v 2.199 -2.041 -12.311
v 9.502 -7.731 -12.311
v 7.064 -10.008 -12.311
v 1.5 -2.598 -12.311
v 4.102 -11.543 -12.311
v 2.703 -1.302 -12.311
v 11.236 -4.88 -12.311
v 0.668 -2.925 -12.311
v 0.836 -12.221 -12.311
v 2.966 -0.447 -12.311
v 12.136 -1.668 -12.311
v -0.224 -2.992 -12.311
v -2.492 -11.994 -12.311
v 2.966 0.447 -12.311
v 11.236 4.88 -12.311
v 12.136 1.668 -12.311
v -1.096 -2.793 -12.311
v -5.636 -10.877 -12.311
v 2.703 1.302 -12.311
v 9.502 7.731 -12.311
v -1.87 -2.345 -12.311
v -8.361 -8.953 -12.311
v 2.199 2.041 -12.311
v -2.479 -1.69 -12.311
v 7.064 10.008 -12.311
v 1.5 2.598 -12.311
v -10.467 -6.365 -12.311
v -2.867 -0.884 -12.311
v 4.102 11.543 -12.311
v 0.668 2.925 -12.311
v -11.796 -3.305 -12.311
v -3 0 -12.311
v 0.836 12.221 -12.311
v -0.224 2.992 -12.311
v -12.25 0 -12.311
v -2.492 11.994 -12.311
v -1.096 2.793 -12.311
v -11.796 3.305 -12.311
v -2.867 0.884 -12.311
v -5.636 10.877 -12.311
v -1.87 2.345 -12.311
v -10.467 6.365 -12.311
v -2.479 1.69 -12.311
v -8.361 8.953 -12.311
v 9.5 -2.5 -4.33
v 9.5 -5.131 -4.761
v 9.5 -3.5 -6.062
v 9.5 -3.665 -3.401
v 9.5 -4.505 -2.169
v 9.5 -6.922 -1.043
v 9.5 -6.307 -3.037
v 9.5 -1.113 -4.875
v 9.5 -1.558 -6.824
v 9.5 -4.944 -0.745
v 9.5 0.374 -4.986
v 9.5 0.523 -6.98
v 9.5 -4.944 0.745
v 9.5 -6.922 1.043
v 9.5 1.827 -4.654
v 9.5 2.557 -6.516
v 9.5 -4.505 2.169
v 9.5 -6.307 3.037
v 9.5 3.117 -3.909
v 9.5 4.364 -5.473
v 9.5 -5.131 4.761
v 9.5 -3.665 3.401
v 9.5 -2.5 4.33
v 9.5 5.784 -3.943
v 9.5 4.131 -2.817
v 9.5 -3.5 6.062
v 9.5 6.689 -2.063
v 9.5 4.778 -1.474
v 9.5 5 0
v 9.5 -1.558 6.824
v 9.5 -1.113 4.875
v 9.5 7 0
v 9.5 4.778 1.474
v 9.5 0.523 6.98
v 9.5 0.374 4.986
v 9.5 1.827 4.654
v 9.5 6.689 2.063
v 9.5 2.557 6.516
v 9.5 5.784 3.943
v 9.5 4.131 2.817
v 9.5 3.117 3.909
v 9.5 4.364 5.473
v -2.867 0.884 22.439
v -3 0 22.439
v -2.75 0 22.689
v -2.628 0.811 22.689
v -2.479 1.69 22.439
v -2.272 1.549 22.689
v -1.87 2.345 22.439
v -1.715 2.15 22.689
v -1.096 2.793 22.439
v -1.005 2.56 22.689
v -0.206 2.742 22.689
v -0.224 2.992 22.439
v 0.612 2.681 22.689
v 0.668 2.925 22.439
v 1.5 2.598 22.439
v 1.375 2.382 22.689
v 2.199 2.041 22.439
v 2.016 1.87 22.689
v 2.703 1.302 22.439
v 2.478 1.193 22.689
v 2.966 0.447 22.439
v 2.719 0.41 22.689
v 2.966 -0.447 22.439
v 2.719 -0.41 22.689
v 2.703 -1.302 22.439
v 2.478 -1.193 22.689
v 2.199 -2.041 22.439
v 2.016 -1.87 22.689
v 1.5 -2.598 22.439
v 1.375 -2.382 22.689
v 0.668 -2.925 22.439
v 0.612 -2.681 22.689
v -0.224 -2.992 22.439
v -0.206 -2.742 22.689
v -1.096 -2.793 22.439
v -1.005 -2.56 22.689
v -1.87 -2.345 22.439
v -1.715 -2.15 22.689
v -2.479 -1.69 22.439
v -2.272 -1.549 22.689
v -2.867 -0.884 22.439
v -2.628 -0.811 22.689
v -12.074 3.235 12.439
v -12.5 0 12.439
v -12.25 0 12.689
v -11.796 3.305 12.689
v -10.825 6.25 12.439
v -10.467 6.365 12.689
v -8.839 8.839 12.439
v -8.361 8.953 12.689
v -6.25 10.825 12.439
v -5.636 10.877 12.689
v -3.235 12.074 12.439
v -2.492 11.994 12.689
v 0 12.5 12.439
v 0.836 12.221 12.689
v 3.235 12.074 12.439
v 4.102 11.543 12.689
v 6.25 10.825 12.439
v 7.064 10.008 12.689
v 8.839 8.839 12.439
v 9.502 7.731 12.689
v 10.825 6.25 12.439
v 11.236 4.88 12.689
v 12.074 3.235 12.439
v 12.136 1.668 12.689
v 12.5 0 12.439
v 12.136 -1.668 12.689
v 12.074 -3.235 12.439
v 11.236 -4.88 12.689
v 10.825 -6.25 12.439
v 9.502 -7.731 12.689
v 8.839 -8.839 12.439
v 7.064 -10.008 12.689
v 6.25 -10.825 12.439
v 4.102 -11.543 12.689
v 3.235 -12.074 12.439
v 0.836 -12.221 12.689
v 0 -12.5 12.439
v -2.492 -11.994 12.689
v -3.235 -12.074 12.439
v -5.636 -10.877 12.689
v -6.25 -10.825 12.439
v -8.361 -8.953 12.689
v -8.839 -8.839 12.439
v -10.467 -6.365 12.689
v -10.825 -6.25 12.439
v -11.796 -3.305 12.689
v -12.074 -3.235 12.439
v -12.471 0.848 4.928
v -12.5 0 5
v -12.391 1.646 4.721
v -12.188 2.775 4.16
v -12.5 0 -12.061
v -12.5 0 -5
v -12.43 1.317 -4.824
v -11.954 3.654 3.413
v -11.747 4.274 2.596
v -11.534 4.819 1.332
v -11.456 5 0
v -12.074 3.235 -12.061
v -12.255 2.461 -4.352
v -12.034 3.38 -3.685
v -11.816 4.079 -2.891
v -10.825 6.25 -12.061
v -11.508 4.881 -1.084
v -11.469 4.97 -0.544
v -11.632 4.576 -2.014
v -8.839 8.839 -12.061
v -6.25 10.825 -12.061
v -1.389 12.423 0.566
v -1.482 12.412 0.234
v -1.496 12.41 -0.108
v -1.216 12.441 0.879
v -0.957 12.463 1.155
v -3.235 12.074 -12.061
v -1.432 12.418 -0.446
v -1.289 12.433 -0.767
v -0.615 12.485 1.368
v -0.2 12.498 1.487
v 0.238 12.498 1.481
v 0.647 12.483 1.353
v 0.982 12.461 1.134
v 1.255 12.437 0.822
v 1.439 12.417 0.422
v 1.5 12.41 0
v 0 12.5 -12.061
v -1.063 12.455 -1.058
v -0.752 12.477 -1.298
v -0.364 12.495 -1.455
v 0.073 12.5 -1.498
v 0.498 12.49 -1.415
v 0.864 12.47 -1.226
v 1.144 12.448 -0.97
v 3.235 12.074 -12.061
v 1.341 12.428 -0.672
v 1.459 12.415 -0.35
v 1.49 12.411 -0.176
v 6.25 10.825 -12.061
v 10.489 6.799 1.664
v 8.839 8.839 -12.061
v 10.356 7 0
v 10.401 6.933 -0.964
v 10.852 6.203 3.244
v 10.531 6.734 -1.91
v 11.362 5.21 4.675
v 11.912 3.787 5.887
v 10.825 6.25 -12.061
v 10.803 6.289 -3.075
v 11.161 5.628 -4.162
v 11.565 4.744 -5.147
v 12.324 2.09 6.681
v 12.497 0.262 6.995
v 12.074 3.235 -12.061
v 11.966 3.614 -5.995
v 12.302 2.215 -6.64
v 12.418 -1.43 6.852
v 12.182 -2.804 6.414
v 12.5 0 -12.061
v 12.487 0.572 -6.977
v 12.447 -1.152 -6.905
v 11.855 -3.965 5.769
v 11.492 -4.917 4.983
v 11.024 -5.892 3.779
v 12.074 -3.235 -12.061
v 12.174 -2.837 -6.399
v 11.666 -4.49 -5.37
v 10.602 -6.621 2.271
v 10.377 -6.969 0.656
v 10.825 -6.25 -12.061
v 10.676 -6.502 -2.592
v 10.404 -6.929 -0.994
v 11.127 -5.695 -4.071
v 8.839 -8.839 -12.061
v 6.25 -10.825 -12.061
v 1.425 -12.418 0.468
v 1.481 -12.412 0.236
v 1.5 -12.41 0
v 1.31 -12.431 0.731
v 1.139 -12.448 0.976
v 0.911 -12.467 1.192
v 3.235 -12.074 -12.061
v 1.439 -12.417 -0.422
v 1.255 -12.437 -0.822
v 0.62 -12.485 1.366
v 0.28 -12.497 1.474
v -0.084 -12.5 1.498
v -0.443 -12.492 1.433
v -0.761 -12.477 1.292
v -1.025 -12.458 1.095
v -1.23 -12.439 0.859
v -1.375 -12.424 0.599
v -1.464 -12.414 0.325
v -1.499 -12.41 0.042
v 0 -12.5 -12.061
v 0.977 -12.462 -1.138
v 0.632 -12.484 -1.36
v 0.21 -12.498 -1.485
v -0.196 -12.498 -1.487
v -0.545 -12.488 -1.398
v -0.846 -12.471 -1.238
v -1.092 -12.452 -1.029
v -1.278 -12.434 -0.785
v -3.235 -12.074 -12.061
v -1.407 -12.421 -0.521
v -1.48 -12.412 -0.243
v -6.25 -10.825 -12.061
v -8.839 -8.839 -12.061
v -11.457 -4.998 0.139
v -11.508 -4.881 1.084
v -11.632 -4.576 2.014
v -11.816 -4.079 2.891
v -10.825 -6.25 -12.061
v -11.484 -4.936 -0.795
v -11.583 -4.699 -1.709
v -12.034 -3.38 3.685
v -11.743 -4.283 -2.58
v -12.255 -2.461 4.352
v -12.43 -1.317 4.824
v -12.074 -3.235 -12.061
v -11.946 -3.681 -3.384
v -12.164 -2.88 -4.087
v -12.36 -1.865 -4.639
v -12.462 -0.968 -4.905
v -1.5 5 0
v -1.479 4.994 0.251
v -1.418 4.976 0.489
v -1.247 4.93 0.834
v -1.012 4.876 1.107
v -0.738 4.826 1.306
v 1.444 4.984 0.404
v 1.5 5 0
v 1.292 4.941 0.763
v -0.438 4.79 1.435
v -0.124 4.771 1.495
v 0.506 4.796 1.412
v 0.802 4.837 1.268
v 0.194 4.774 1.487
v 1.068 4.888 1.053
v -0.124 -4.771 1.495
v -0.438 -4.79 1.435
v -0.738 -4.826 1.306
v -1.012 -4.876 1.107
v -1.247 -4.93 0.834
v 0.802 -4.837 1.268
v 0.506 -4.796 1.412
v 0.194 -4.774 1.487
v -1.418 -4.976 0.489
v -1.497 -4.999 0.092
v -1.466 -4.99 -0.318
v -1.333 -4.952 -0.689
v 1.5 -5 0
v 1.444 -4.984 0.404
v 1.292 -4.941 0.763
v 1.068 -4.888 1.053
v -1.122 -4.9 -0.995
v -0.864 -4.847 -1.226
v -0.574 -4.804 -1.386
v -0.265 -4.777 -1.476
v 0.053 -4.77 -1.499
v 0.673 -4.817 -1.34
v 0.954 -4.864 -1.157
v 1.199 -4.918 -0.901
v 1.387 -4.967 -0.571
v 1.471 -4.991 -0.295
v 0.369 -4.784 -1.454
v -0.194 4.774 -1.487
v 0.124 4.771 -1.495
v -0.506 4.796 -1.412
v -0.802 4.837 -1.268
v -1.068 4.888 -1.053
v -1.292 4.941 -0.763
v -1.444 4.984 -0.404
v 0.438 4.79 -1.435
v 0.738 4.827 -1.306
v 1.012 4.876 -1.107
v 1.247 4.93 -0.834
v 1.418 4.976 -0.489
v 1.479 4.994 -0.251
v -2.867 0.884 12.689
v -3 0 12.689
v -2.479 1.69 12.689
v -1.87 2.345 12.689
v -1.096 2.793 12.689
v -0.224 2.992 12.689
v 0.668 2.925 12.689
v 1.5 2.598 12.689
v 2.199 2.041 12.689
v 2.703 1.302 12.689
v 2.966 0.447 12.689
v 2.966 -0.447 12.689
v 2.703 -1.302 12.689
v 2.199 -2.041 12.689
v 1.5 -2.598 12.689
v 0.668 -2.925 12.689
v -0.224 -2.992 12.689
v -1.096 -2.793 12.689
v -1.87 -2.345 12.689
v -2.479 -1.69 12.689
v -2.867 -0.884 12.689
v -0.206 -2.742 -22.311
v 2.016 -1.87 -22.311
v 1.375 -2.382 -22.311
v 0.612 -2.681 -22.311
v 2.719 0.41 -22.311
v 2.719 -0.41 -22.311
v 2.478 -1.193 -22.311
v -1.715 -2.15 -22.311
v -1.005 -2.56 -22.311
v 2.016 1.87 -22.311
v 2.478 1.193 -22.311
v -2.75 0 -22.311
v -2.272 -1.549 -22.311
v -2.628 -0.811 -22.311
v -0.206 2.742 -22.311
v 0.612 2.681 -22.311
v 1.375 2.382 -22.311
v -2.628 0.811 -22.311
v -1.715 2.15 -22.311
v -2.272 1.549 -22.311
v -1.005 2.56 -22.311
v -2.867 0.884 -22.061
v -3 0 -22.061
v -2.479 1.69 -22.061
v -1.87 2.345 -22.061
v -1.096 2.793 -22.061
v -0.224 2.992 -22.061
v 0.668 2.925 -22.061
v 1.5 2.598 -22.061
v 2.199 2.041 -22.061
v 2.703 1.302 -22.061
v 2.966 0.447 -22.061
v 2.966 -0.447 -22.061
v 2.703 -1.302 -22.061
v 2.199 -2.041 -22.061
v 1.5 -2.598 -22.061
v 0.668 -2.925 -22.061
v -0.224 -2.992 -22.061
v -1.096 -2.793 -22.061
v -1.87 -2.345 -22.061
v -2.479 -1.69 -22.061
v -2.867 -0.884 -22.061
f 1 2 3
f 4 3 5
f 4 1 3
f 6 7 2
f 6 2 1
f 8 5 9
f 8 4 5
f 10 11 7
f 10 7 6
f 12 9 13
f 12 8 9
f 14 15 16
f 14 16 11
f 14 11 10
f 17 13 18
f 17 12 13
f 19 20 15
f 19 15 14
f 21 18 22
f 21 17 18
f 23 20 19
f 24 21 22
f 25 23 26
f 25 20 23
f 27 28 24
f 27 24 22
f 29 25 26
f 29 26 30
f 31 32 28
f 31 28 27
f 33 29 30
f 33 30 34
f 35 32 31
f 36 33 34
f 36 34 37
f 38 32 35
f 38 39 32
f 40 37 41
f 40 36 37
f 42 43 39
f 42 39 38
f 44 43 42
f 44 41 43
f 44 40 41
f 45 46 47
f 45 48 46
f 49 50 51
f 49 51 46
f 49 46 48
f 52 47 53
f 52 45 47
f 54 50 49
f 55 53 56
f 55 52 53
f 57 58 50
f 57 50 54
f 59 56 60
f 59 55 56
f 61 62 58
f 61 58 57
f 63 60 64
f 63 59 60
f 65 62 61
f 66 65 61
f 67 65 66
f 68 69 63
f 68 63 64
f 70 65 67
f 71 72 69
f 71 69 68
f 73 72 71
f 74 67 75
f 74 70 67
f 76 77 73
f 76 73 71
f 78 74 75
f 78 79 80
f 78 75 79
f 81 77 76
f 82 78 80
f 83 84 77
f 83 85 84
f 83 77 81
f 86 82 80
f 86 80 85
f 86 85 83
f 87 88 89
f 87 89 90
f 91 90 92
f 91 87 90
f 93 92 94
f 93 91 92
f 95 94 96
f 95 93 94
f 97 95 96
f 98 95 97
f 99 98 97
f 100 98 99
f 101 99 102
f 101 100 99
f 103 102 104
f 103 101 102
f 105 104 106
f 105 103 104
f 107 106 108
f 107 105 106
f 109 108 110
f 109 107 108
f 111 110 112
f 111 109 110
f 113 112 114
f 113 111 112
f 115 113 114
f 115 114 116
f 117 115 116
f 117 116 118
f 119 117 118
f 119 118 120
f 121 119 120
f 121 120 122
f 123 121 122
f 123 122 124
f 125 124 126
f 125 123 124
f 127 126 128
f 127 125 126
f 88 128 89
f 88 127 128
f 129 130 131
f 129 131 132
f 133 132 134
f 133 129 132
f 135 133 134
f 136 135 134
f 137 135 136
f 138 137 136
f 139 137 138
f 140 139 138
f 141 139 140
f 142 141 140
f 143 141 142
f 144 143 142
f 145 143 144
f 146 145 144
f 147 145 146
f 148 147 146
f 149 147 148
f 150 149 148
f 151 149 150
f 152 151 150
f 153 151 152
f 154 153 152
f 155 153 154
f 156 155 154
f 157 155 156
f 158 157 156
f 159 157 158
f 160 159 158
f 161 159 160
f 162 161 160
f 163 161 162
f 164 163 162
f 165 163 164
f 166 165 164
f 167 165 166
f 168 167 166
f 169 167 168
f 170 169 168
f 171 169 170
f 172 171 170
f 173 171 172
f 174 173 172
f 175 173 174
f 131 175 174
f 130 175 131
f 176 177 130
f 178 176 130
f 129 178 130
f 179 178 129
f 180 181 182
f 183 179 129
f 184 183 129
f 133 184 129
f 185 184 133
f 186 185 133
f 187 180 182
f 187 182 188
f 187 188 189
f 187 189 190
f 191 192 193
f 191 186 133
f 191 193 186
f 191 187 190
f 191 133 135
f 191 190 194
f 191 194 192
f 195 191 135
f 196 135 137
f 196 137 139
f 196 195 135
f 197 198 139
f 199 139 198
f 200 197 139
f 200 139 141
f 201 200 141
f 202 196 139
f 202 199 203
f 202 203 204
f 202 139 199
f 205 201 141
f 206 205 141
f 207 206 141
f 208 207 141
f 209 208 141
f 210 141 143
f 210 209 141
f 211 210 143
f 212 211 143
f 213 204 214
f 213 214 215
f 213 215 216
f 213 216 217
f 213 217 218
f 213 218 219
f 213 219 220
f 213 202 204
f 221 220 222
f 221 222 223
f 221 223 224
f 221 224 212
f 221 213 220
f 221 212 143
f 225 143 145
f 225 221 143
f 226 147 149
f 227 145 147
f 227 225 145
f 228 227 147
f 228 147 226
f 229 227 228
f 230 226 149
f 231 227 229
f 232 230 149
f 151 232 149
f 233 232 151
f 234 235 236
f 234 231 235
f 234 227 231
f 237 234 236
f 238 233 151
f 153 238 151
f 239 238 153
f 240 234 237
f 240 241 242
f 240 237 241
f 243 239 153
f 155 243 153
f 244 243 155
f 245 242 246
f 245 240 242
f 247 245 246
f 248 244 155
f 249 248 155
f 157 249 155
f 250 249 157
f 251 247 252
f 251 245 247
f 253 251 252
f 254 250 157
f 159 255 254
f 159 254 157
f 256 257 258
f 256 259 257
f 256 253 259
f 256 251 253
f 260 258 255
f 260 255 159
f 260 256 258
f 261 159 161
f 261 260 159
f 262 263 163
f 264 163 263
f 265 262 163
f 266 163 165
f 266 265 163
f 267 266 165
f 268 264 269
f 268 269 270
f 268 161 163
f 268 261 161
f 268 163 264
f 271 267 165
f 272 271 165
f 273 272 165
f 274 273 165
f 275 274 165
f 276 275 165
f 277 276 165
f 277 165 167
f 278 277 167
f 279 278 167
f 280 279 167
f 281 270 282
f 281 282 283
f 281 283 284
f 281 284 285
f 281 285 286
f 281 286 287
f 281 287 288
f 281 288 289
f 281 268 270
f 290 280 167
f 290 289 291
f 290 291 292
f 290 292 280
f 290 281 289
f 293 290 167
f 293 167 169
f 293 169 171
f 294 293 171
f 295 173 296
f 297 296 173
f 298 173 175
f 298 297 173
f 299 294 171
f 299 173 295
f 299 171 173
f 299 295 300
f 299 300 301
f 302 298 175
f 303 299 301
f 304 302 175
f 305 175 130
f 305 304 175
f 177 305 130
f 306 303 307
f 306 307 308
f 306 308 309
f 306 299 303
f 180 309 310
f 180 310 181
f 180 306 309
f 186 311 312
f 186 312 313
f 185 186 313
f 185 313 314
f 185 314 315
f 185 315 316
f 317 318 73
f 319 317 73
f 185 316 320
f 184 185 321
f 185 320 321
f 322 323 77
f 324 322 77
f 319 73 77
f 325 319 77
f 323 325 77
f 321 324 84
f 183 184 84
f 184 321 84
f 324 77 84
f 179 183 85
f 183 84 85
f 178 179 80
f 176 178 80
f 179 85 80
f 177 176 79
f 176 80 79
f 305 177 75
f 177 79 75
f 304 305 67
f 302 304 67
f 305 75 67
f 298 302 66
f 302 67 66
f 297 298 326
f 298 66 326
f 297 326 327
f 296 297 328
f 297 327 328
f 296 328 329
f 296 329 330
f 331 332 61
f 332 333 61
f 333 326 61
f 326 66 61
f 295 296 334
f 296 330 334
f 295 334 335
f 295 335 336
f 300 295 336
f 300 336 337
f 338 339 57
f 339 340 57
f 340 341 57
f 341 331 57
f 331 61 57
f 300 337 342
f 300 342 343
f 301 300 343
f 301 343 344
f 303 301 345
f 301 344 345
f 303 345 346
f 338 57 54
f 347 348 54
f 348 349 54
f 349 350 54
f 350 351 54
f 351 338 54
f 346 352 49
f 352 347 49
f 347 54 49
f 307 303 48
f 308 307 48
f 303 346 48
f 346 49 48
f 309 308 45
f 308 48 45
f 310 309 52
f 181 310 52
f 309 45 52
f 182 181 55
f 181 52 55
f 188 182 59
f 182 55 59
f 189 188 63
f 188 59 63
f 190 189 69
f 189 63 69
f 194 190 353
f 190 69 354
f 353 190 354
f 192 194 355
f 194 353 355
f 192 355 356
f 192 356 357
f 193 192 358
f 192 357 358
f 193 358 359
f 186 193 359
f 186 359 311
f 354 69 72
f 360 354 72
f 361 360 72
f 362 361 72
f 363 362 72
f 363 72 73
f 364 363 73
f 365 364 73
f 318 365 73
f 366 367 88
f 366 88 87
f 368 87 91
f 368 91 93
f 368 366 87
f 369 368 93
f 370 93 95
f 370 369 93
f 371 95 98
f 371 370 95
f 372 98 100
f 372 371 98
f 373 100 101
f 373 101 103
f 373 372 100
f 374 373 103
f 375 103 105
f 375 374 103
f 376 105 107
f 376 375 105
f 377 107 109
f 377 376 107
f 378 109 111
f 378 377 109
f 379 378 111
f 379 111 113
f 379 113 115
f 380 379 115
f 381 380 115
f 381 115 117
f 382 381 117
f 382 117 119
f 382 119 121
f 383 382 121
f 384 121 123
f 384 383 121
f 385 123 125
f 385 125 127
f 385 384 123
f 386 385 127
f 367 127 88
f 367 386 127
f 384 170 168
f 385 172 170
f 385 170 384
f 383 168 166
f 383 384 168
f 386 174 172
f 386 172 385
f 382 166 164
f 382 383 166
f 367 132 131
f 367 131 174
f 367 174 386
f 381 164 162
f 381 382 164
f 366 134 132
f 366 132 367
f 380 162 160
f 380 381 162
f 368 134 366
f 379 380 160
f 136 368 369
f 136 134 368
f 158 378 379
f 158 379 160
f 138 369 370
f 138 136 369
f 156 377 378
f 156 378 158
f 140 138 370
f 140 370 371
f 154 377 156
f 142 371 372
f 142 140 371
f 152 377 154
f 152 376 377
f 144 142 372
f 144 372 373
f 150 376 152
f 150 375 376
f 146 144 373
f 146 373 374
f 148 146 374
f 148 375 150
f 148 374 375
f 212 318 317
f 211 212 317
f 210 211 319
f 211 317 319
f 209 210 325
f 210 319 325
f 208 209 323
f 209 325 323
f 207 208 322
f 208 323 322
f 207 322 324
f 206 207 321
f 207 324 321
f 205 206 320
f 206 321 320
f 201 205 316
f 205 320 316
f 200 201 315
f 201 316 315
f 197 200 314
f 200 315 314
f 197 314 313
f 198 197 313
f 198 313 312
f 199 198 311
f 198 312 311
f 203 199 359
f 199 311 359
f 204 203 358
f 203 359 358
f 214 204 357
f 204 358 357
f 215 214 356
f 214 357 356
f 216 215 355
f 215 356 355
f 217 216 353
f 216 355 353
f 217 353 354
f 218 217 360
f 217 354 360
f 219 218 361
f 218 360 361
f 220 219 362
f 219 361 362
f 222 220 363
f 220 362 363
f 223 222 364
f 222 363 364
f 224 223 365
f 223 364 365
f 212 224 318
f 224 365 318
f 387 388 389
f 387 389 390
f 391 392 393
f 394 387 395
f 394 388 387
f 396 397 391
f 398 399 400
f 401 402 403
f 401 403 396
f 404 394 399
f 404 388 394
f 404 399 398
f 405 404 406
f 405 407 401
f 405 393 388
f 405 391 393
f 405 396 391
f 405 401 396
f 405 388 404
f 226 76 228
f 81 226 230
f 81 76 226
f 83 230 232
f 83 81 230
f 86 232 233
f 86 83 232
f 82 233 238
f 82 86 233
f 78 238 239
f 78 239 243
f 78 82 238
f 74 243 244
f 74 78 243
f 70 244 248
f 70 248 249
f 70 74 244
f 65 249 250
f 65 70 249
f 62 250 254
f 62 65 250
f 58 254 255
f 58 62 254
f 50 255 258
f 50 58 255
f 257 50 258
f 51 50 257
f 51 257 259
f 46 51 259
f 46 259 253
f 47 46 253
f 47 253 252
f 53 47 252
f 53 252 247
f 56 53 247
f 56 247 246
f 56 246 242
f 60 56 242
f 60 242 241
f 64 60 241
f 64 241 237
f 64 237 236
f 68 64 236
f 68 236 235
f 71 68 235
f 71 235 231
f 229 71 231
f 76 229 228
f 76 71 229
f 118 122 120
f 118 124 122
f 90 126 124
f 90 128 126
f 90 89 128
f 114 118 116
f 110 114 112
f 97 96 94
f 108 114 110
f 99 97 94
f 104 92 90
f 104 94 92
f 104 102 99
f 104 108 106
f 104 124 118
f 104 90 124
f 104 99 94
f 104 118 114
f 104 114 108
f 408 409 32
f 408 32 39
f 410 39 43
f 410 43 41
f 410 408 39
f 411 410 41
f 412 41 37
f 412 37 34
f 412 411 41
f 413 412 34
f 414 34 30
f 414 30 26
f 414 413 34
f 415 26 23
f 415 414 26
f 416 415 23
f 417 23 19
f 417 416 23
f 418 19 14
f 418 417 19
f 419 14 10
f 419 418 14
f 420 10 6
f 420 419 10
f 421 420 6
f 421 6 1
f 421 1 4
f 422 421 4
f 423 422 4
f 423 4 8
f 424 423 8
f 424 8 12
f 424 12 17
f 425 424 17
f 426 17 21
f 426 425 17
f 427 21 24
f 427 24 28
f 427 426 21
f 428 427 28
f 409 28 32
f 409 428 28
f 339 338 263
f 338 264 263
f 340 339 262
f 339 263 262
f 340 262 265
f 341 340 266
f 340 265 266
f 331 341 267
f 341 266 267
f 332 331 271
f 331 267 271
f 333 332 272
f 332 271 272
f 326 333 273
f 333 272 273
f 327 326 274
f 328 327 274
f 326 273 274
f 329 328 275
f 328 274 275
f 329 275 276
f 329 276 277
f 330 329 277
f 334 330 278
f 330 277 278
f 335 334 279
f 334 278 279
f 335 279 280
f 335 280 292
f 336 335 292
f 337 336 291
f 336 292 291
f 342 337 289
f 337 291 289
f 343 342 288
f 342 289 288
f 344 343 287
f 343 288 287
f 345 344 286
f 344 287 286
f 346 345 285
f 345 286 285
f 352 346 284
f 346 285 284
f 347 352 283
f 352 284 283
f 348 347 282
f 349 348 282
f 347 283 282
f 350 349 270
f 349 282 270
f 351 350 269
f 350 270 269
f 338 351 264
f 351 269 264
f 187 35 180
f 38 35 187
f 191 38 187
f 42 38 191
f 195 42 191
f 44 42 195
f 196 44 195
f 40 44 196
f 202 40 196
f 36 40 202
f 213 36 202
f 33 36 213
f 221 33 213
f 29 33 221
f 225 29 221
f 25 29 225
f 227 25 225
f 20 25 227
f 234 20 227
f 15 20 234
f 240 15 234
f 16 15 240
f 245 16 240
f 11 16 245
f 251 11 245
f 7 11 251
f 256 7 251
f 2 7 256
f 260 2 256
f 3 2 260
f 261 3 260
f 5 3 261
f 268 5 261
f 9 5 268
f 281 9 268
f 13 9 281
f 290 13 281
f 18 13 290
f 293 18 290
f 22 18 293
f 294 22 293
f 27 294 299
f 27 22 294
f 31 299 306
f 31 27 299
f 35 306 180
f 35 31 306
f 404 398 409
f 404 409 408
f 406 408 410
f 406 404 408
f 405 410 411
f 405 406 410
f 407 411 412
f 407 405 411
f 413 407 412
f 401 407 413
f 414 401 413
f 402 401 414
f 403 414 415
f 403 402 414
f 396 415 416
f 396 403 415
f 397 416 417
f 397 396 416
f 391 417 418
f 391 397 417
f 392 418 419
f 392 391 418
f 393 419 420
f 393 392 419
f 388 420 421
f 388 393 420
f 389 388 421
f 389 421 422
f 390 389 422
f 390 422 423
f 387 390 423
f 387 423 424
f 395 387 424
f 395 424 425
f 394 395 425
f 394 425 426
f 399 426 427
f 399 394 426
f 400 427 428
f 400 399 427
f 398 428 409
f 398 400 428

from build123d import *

# Parameters (mm, degrees)
F2_SIZE  = 0.25
F3_R     = 1.5
F5_DEPTH = 12.5
F4_R     = 5
F6_DEPTH = 12.5
F8_START = 9.5
F7_R     = 7
F8_DEPTH = 4.5


with BuildPart() as f1:
    # F0 (on Front) → F1 (revolve)
    with BuildSketch(Plane.XZ):
        Polygon((0, -22.3108624175), (0, 22.6891375825), (-3, 22.6891375825), (-3, 12.6891375825), (-12.5, 12.6891375825), (-12.5, -12.3108624175), (-3, -12.3108624175), (-3, -22.3108624175), align=None)
    revolve(axis=Axis((0, 0, 0.1891375825), (0, 0, -1)))

    # F2
    f2_edges = [f1.edges().sort_by_distance(p)[0] for p in [
        (3, 0, 22.689138),
        (3, 0, -22.310862),
        (12.5, 0, 12.689138),
        (12.5, 0, -12.310862),
    ]]
    chamfer(f2_edges, length=F2_SIZE)

    # F3 (on Front) → F5 (cut, symmetric)
    with BuildSketch(Plane.XZ):
        Circle(F3_R)
    extrude(amount=F5_DEPTH, both=True, mode=Mode.SUBTRACT)

    # F4 (on Right) → F6 (cut, symmetric)
    with BuildSketch(Plane.YZ):
        Circle(F4_R)
    extrude(amount=F6_DEPTH, both=True, mode=Mode.SUBTRACT)

    # F7 (on Right) → F8 (cut)
    with BuildSketch(Plane.YZ.offset(F8_START)):
        Circle(F7_R)
    extrude(amount=F8_DEPTH, mode=Mode.SUBTRACT)


solid = f1.part
